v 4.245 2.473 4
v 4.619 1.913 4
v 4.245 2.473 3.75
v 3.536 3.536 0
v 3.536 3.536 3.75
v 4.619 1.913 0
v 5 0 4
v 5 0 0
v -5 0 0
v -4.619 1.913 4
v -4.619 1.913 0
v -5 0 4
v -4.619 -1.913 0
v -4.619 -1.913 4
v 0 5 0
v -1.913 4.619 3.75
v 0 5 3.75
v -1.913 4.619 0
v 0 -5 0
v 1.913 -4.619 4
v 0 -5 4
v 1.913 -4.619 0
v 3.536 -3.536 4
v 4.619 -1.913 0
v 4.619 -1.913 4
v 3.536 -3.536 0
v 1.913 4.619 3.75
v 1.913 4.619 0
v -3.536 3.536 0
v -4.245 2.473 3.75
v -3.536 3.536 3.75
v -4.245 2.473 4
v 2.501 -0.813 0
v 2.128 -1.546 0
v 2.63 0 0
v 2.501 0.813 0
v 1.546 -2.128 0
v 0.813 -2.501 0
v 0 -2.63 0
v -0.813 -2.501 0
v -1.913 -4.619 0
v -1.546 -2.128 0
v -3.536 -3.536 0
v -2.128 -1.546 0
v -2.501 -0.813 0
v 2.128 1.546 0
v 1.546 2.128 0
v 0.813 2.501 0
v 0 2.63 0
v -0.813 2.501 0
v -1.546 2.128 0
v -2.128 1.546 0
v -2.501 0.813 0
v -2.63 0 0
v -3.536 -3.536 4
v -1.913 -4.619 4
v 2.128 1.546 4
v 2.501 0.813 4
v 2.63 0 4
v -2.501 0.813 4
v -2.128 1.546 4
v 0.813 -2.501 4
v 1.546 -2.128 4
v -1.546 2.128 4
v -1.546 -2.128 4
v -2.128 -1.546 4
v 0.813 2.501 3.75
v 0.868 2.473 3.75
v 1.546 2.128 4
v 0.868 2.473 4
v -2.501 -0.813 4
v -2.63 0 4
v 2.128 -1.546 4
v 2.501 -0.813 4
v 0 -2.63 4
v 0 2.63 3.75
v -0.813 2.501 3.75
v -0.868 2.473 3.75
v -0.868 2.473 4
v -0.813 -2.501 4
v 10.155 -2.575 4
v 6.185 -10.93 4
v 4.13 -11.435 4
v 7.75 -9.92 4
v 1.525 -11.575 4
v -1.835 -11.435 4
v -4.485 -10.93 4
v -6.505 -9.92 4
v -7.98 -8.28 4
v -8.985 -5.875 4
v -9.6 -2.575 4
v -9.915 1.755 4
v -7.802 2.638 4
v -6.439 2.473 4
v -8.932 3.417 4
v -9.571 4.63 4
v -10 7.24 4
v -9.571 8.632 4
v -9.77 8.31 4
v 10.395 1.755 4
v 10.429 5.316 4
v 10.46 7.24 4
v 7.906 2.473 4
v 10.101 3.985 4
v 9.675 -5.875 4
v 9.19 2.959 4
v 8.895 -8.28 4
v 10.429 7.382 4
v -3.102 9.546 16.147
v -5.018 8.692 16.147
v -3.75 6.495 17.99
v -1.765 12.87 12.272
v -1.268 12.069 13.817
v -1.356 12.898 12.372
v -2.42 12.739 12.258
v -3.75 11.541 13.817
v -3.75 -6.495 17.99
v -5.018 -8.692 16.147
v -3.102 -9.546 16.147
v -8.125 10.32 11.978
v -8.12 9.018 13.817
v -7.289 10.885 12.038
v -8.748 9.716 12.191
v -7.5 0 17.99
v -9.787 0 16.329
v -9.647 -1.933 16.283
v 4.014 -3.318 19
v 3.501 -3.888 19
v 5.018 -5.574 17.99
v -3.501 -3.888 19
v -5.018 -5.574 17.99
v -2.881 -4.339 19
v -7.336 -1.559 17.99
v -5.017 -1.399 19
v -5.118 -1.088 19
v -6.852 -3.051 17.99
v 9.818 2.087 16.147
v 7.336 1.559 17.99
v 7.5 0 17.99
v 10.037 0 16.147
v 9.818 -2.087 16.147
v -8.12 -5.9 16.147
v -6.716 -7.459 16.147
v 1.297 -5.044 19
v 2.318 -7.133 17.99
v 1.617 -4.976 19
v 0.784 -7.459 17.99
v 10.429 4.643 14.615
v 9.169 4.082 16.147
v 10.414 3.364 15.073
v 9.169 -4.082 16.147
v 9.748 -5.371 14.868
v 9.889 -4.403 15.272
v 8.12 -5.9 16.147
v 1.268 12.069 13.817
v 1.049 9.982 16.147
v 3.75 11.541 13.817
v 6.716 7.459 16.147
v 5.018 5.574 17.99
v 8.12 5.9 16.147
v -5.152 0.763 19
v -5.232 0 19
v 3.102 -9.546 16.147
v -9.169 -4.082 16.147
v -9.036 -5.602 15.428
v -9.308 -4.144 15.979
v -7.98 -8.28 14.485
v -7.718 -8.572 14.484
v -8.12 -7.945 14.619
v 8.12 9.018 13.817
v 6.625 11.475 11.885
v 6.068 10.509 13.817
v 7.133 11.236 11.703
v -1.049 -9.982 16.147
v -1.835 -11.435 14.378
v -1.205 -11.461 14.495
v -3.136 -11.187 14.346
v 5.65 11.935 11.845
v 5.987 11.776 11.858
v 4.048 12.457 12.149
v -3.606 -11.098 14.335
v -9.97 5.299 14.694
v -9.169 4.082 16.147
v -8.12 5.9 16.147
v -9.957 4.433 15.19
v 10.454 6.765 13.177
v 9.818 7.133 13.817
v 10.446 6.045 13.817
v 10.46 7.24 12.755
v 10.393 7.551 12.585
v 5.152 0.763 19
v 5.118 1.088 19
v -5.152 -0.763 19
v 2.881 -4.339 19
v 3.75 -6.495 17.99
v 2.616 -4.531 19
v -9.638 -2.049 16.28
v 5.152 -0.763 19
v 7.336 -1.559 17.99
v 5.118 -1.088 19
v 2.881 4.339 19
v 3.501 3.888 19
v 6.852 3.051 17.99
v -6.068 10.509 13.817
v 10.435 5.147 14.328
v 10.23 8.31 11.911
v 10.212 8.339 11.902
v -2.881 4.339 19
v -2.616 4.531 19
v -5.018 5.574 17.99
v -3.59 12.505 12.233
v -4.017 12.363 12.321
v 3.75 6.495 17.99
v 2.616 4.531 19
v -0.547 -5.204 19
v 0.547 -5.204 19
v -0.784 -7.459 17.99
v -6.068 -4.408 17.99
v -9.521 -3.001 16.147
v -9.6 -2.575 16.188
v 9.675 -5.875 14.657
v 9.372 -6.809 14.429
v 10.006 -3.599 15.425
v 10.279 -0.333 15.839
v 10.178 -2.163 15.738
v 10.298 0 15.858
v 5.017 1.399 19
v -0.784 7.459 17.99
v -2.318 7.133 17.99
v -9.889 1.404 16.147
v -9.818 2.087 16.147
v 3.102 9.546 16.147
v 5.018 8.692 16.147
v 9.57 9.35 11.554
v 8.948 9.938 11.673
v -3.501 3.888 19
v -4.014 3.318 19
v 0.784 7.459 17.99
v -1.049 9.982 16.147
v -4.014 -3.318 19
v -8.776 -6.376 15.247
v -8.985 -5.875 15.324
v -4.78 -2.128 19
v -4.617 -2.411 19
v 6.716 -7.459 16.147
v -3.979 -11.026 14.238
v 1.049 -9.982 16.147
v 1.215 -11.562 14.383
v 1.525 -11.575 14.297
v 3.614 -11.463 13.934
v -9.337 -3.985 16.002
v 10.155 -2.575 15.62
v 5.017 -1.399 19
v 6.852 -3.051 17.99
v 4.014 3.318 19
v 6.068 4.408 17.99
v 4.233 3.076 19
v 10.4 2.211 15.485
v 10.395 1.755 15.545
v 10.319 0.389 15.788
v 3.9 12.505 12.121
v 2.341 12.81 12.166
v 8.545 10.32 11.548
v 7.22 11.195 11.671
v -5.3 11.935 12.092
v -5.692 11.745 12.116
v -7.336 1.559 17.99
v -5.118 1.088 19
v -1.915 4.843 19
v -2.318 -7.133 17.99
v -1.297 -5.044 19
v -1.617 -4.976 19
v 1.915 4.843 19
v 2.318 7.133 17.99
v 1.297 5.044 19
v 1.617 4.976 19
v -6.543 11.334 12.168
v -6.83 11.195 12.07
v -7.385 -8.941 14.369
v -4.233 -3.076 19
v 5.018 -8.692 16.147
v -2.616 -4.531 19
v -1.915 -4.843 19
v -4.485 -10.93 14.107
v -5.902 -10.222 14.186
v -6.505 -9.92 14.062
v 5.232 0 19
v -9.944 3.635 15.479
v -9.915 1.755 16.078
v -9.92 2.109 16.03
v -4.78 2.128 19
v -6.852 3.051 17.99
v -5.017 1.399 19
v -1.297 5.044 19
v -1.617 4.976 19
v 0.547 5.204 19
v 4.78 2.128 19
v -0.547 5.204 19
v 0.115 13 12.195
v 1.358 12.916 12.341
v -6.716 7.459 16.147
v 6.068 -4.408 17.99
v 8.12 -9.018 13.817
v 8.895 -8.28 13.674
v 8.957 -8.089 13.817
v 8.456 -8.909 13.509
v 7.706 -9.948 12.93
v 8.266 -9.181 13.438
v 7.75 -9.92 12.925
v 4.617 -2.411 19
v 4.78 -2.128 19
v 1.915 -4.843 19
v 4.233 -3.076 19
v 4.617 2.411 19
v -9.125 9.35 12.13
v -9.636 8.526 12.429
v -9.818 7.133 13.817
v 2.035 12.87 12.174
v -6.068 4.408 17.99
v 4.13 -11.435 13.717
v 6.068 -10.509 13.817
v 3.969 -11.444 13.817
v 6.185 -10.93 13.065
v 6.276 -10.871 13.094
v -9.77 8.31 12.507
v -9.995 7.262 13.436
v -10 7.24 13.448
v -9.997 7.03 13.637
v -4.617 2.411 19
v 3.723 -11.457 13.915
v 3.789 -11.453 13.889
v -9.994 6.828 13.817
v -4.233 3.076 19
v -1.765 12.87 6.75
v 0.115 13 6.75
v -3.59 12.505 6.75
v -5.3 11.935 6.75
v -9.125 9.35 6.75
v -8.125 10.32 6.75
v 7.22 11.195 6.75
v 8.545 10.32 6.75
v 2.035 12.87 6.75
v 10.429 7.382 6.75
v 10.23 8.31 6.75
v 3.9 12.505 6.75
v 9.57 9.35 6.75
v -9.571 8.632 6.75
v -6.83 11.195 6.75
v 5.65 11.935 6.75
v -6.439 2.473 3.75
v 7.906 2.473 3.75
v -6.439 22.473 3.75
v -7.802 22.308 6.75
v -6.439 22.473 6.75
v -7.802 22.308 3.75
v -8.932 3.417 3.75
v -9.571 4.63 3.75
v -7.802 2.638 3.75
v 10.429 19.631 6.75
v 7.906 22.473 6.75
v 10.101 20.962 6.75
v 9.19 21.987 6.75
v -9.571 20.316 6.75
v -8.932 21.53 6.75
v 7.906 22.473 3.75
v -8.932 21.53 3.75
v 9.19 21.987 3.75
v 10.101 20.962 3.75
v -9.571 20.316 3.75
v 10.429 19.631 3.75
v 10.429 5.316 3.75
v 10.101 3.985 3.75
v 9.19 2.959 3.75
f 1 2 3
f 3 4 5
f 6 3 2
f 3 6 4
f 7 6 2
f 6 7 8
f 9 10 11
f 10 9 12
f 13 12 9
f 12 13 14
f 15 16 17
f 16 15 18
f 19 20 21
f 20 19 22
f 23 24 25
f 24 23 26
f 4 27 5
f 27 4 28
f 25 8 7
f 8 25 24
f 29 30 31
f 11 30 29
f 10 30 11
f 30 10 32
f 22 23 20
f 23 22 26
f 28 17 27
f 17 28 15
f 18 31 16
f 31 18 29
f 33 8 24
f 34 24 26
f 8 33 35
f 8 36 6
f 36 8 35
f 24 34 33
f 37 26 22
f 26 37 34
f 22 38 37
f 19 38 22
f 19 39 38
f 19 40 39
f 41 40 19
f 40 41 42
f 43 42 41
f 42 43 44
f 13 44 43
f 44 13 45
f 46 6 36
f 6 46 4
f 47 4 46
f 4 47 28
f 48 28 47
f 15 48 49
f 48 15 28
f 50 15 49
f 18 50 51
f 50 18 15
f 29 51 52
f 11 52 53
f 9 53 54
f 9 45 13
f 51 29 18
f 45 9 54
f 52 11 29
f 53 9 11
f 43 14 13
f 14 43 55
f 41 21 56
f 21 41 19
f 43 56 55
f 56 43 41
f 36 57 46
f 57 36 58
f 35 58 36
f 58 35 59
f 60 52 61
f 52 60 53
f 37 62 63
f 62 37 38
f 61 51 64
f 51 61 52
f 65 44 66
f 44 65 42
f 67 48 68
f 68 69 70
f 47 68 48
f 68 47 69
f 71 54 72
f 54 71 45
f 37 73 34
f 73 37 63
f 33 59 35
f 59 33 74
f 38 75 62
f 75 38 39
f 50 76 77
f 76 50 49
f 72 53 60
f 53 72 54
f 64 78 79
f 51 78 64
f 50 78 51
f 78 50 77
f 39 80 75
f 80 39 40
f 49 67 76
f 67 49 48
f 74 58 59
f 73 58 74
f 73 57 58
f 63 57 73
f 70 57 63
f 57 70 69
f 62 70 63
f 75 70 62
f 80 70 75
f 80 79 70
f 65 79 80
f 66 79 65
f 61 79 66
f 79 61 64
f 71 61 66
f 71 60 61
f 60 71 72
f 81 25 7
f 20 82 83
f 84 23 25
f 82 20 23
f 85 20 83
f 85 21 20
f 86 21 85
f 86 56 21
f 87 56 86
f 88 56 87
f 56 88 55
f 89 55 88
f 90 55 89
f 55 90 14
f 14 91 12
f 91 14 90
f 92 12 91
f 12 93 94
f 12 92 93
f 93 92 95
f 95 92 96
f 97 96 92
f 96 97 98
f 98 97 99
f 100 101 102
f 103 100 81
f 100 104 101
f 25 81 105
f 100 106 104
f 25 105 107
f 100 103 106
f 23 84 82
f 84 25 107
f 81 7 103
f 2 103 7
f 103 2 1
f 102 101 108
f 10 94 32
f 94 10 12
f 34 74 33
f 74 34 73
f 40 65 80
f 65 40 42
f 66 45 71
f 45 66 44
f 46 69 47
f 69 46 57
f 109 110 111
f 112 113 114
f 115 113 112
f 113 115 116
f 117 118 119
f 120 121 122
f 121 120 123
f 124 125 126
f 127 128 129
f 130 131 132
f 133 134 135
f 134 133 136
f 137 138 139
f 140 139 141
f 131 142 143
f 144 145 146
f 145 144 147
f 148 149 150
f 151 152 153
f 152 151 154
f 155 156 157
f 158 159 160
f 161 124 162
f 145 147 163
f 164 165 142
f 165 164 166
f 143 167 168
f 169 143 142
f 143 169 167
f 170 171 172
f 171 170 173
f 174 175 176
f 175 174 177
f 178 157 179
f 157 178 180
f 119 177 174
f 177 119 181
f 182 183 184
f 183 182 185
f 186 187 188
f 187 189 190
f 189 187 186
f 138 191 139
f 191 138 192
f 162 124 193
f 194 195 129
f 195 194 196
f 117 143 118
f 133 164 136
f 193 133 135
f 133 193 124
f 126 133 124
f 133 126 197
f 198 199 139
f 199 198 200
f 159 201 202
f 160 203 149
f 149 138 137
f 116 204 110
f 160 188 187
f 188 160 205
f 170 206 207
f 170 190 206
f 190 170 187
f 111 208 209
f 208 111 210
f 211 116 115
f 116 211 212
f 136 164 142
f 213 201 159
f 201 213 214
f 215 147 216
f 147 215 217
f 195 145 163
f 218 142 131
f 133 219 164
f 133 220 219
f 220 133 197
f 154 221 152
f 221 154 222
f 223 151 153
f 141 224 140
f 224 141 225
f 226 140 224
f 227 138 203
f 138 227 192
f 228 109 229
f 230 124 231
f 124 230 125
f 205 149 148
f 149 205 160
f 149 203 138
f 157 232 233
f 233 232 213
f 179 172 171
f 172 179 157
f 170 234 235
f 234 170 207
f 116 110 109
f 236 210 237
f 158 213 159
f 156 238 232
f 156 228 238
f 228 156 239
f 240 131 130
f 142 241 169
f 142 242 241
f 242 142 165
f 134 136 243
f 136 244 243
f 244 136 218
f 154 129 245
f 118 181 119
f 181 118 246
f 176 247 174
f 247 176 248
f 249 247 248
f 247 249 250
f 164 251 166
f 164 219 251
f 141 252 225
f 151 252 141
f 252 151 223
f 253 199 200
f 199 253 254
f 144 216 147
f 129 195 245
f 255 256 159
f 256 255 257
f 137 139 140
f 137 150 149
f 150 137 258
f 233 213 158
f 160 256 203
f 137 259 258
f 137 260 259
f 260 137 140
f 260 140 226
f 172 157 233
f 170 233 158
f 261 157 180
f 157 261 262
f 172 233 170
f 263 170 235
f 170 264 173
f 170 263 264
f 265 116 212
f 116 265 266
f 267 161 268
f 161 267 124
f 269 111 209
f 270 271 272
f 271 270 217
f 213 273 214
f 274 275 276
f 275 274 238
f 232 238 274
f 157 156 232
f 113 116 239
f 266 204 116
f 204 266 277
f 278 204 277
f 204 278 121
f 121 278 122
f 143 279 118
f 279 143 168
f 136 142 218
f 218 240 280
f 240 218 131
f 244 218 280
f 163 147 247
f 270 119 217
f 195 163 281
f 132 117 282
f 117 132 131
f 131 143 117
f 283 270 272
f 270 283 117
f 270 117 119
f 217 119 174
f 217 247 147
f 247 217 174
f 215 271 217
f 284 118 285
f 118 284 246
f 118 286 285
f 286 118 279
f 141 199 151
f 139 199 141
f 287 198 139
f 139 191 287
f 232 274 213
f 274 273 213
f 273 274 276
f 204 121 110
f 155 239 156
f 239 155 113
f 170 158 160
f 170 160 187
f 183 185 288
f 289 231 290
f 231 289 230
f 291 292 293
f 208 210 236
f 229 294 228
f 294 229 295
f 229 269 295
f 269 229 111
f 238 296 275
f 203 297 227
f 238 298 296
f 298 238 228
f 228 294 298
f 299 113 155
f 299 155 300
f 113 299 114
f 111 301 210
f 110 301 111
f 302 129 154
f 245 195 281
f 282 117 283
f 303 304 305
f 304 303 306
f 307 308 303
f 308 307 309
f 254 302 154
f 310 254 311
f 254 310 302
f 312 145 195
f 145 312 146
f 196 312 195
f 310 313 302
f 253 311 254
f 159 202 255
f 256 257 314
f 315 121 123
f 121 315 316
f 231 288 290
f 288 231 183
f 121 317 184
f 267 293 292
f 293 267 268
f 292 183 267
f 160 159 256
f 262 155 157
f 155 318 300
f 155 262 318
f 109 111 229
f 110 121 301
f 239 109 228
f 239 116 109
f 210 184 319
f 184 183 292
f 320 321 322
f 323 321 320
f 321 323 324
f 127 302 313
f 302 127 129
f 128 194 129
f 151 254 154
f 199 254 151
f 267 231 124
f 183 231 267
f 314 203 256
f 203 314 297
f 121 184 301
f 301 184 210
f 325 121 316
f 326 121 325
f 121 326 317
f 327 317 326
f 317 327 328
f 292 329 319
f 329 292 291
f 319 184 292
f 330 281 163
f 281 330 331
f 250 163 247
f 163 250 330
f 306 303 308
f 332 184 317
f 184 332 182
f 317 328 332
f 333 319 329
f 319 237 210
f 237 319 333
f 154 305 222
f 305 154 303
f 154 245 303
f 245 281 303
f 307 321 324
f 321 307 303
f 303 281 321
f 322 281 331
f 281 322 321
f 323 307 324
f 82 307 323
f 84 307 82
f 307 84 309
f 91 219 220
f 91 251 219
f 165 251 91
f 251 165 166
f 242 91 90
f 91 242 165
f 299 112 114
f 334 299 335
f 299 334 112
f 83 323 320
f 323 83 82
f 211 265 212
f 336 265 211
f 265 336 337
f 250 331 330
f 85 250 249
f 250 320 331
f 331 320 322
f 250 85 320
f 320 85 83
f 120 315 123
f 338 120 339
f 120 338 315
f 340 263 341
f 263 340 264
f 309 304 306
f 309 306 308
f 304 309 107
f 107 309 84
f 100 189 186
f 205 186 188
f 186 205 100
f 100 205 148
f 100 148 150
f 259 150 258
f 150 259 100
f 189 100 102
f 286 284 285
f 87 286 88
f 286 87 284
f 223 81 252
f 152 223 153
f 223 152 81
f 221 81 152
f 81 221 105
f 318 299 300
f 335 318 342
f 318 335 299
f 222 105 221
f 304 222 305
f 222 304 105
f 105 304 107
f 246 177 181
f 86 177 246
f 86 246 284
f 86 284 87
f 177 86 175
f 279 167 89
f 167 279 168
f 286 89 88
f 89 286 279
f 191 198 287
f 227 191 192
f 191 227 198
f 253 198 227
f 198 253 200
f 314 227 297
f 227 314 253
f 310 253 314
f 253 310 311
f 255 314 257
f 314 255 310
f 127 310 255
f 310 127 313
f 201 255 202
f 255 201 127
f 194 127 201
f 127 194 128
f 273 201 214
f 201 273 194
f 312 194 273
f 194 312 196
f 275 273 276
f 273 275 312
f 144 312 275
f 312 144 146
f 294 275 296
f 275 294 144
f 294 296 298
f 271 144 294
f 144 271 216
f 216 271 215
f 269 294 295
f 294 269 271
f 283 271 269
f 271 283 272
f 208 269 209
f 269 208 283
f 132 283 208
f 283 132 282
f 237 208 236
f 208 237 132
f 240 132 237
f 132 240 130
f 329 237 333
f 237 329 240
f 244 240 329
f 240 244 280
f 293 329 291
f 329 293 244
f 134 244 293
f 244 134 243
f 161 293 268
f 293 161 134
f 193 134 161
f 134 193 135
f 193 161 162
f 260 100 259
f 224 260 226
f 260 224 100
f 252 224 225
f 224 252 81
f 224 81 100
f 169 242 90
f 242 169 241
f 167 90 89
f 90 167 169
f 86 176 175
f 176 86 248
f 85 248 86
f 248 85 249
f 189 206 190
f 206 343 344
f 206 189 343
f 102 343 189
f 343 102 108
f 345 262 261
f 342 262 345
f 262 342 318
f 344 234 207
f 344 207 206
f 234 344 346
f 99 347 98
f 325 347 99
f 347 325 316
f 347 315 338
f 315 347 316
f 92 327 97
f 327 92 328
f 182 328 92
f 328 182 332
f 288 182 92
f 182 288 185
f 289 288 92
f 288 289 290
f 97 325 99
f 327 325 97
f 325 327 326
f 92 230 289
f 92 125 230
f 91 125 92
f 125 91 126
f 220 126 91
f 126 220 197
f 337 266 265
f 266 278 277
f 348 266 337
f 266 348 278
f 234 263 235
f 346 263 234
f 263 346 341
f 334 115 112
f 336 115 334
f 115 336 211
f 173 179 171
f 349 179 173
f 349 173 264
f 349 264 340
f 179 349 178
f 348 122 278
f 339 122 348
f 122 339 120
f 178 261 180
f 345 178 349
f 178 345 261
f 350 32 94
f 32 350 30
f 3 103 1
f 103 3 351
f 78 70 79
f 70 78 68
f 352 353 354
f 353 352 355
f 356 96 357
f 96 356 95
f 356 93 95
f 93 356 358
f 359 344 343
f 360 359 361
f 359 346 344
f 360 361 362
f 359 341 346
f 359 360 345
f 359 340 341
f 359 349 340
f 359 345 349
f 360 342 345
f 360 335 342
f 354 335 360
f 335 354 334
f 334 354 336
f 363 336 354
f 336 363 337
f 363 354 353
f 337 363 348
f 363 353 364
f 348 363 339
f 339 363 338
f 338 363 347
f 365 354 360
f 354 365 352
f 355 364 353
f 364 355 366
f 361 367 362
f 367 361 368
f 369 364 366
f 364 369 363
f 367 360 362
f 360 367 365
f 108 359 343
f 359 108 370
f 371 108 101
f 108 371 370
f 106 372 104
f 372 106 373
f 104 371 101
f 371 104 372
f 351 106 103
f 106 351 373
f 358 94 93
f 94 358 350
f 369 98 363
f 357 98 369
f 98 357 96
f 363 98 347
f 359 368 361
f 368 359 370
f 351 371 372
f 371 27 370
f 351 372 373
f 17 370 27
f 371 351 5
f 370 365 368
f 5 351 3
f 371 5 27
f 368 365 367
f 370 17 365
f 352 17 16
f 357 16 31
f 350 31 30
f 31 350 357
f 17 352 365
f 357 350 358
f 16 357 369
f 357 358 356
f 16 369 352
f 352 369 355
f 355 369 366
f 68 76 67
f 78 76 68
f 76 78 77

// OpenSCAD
module base(){

scale([0.5,0.5,0.5])
linear_extrude(height = 30, center = false) {

polygon(points=[[0,-11.52],[0.46,-9.38],[1.75,-7.3],[3.75,-5.36],[6.34,-3.61],[9.4,-2.13],[12.82,-0.99],[16.47,-0.26],[20.23,0],[24.07,-0.26],[27.8,-0.99],[31.3,-2.13],[34.44,-3.61],[37.09,-5.36],[39.14,-7.3],[40.46,-9.38],[40.92,-11.52],[40.79,-22.49],[40.31,-31.15],[39.35,-37.75],[37.79,-42.56],[35.5,-45.84],[32.37,-47.86],[28.26,-48.87],[23.05,-49.15],[16.33,-48.87],[11.03,-47.86],[6.99,-45.84],[4.04,-42.56],[2.03,-37.75],[0.8,-31.15],[0.17,-22.49]]);

}

}


difference(){
cylinder(h=5,r=5);
translate([0,0,-6
])
cylinder(h=10,r=2.63,$fn=20);

}






module top(){

difference(){
sphere(30);
sphere(15);
translate([0,0,-15])
cube(40,center=true);
}
}


difference(){

translate([-10,13,4])
base();
translate([0,0,5])
top();
}



translate([-7,-9,1]){
resize([20,20,3]){

minkowski()
{
translate([0.3,10,5])
cube([20,20,3],center=true);

translate([10,20,2])
cylinder(h=3,r=4);
}

}
}
